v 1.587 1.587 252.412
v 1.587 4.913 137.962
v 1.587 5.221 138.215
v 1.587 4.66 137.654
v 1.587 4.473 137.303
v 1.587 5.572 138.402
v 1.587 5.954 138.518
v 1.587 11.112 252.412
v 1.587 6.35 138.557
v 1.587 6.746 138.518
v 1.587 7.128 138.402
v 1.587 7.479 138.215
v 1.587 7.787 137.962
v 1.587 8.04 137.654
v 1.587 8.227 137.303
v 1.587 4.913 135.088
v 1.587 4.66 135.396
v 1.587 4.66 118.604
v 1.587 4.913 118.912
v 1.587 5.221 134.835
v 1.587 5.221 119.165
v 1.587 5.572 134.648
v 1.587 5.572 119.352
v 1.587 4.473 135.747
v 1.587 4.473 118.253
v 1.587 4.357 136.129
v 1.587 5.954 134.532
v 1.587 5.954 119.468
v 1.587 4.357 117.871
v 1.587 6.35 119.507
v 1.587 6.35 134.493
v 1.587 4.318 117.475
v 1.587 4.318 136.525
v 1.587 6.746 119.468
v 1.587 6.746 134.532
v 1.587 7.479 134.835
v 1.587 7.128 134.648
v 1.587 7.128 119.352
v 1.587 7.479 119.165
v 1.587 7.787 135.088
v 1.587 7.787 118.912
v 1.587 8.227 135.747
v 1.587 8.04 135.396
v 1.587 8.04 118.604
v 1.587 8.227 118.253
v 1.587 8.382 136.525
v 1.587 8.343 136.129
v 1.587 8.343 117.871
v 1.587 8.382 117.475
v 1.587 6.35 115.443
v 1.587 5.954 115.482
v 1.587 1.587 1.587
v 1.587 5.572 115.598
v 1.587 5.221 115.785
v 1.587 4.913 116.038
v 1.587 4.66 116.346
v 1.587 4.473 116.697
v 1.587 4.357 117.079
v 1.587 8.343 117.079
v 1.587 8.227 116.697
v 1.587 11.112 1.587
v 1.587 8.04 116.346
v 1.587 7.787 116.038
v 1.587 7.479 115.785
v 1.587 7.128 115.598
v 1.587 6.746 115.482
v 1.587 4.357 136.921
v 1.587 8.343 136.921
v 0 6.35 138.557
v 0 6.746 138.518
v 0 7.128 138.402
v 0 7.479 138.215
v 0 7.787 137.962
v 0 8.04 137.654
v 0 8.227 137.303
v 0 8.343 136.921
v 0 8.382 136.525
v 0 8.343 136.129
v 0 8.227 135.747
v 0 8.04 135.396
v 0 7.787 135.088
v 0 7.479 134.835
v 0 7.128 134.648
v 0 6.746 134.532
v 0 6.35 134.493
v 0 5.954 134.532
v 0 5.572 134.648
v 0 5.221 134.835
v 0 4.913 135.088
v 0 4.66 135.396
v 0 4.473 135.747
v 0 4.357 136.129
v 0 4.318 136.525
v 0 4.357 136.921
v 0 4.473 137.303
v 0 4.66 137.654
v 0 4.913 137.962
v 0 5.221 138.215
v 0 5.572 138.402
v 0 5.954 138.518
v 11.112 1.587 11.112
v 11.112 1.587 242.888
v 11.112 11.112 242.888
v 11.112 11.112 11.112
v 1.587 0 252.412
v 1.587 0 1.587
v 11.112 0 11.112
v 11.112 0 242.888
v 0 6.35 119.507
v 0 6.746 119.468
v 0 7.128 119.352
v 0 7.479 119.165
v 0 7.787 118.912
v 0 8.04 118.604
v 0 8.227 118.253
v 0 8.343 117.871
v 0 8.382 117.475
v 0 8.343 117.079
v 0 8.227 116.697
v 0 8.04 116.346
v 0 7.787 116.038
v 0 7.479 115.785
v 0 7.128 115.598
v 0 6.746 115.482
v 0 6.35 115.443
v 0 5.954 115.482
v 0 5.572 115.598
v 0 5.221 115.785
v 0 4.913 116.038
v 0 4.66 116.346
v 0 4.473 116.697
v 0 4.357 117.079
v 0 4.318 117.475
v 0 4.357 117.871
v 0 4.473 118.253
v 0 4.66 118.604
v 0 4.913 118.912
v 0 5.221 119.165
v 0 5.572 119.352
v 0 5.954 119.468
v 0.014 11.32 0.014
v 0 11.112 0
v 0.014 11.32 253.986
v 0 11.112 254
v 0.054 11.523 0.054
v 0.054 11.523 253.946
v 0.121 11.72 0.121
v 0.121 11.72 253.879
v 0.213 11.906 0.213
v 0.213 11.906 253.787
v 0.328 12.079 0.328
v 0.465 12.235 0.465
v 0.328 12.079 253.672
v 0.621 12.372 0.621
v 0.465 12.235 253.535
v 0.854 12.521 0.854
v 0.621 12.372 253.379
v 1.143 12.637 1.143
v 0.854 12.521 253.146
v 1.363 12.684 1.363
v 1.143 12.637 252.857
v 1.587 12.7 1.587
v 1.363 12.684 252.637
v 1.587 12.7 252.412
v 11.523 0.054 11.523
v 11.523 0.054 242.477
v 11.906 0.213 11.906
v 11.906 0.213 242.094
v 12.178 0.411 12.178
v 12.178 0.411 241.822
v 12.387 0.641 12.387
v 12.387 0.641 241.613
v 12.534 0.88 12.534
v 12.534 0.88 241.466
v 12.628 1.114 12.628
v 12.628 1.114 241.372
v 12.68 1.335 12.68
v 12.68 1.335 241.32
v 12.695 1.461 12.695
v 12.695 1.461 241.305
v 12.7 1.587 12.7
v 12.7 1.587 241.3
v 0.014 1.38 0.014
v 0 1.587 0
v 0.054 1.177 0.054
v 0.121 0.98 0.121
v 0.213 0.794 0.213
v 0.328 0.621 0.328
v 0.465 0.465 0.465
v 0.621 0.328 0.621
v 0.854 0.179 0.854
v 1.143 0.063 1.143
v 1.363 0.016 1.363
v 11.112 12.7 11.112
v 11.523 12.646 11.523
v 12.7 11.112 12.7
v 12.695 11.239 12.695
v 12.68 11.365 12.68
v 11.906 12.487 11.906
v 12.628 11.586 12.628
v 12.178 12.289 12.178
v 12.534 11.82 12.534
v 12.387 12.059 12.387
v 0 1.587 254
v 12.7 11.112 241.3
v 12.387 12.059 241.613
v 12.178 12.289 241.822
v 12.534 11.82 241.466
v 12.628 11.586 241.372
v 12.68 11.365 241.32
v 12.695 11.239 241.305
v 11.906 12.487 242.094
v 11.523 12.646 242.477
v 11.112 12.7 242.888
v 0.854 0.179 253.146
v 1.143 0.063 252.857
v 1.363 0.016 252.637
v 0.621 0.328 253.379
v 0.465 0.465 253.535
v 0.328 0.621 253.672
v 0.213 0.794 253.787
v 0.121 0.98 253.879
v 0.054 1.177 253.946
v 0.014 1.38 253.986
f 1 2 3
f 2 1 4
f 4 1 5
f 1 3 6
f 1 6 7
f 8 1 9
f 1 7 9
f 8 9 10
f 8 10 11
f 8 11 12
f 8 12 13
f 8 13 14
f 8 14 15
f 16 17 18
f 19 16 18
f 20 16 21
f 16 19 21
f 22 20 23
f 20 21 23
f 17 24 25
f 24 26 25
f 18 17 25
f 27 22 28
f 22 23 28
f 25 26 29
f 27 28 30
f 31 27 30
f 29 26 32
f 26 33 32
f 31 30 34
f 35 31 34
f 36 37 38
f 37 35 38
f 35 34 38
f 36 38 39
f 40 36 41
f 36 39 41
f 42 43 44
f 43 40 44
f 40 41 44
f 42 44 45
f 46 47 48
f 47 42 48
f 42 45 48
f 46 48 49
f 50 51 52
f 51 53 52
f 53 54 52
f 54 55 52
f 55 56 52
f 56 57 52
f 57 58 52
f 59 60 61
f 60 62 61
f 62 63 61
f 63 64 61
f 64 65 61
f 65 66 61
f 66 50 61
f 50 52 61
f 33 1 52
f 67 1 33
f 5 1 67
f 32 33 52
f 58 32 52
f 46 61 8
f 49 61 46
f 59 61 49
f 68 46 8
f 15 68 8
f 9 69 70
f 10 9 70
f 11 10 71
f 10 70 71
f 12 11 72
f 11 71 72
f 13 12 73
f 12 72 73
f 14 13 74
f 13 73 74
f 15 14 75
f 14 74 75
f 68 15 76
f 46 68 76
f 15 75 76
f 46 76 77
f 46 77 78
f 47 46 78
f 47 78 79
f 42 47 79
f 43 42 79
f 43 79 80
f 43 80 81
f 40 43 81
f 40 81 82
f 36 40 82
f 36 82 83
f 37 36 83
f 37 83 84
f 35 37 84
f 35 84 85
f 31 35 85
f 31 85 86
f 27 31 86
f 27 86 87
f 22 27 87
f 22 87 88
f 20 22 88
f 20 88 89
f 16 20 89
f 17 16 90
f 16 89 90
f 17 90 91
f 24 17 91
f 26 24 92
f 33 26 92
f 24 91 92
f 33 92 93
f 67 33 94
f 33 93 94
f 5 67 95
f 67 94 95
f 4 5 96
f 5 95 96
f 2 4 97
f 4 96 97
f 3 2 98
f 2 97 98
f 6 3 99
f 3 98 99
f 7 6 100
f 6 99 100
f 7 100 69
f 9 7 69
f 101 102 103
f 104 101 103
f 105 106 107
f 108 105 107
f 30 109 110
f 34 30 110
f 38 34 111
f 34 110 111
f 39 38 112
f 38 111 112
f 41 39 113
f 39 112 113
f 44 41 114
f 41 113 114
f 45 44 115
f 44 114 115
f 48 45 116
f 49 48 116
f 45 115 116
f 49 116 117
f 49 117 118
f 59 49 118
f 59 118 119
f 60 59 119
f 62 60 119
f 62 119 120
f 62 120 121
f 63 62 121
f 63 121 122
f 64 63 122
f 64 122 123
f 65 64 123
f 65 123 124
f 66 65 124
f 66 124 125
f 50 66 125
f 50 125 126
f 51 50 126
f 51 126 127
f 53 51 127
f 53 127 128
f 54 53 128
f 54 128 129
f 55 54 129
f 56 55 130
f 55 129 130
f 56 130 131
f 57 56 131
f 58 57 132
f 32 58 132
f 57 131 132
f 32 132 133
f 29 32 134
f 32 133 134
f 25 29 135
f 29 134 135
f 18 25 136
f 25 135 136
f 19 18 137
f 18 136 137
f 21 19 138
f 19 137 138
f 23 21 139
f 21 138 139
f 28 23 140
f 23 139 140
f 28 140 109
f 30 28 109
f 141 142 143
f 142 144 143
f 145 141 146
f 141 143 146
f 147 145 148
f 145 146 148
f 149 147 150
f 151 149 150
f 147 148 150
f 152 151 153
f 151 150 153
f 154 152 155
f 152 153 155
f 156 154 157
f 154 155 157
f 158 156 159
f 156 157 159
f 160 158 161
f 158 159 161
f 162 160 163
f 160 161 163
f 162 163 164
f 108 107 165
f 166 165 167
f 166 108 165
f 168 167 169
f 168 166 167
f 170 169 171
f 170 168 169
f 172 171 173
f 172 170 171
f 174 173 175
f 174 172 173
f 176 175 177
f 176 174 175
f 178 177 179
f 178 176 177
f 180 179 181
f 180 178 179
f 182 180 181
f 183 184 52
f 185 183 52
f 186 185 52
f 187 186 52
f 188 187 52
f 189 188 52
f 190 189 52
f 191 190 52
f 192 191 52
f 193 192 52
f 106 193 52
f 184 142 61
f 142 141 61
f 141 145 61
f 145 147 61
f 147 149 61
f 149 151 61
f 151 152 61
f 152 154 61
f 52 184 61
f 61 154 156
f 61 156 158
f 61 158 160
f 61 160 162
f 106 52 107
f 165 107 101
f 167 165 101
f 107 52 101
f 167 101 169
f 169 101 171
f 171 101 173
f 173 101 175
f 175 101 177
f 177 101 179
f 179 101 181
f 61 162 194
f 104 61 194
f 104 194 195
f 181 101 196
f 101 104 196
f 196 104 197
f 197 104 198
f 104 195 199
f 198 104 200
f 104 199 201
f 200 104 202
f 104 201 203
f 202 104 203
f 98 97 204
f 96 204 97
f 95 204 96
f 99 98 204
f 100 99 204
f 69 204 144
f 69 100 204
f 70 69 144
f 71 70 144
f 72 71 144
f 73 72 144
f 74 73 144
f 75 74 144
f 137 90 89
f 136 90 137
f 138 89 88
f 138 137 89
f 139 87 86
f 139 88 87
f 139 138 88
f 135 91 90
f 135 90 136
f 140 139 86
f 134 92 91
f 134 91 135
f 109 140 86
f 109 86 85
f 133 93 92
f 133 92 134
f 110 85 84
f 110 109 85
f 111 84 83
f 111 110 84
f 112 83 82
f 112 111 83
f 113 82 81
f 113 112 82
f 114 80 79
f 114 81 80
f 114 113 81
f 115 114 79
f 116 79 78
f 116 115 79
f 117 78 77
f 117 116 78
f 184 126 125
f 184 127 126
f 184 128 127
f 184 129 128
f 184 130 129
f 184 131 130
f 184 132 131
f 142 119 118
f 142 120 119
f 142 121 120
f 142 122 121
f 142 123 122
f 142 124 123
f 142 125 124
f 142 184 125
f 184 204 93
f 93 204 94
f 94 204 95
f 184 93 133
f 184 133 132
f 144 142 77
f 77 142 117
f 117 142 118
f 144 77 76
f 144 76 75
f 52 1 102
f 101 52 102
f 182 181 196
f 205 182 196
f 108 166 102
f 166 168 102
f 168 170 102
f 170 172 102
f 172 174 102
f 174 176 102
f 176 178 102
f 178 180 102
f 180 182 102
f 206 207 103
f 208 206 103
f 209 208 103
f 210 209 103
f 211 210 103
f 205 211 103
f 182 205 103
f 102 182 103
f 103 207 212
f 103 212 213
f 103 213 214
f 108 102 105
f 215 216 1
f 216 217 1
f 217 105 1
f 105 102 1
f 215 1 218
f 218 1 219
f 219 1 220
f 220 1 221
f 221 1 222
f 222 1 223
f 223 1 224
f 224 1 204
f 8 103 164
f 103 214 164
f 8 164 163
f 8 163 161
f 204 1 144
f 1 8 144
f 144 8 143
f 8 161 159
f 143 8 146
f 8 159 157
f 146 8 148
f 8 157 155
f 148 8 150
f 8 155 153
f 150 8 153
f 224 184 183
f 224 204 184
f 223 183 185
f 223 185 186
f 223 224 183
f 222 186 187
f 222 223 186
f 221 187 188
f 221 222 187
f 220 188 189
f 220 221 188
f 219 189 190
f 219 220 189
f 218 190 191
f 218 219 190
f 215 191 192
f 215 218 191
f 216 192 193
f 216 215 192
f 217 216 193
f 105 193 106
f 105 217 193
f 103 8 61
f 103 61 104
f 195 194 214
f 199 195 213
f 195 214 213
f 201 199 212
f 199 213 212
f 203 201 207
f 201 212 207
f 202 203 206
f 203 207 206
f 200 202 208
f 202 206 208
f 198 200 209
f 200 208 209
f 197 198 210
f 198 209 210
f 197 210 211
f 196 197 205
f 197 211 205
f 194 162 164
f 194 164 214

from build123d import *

# Parameters (mm, degrees)
SKETCH1_W           = 12.7
SKETCH1_H           = 12.7
SKETCH1_W_2         = 9.525
SKETCH1_H_2         = 9.525
BOSS_EXTRUDE1_DEPTH = 254
CUT_EXTRUDE1_DEPTH  = 13.7
FILLET1_R           = 1.5875
CUT_EXTRUDE2_REACH  = 14.7
SKETCH3_R           = 2.032


with BuildPart() as part:
    # Sketch1 → Boss-Extrude1 (new body)
    with BuildSketch(Plane.XY):
        with Locations((6.35, 6.35)):
            Rectangle(SKETCH1_W, SKETCH1_H)
        with Locations((6.35, 6.35)):
            Rectangle(SKETCH1_W_2, SKETCH1_H_2, mode=Mode.SUBTRACT)
    extrude(amount=BOSS_EXTRUDE1_DEPTH)

    # Sketch2 → Cut-Extrude1 (cut, through all)
    with BuildSketch(Plane(origin=(0, 12.7, 0), x_dir=(1, 0, 0), z_dir=(0, 1, 0))):
        Polygon((0, -254), (12.7, -254), (12.7, -241.3), align=None)
        Polygon((0, 0), (12.7, -12.7), (12.7, 0), align=None)
    extrude(amount=-CUT_EXTRUDE1_DEPTH, mode=Mode.SUBTRACT)

    # Fillet1
    fillet1_edges = [part.edges().sort_by_distance(p)[0] for p in [
        (12.7, 12.7, 127),
        (12.7, 0, 127),
        (0, 12.7, 127),
        (0, 0, 127),
    ]]
    fillet(fillet1_edges, radius=FILLET1_R)

    # Sketch3 → Cut-Extrude2 (cut, up to next)
    with BuildSketch(Plane.ZY, mode=Mode.PRIVATE) as cut_extrude2_sk1:
        with Locations((136.525, 6.35)):
            Circle(SKETCH3_R)
    cut_extrude2_tool1 = extrude(cut_extrude2_sk1.sketch, amount=-CUT_EXTRUDE2_REACH, mode=Mode.PRIVATE) & part.part
    add(cut_extrude2_tool1.solids().sort_by_distance((0, 6.35, 136.525))[0], mode=Mode.SUBTRACT)
    # Sketch3 → Cut-Extrude2 (cut, up to next)
    with BuildSketch(Plane.ZY, mode=Mode.PRIVATE) as cut_extrude2_sk2:
        with Locations((117.475, 6.35)):
            Circle(SKETCH3_R)
    cut_extrude2_tool2 = extrude(cut_extrude2_sk2.sketch, amount=-CUT_EXTRUDE2_REACH, mode=Mode.PRIVATE) & part.part
    add(cut_extrude2_tool2.solids().sort_by_distance((0, 6.35, 117.475))[0], mode=Mode.SUBTRACT)


solid = part.part
